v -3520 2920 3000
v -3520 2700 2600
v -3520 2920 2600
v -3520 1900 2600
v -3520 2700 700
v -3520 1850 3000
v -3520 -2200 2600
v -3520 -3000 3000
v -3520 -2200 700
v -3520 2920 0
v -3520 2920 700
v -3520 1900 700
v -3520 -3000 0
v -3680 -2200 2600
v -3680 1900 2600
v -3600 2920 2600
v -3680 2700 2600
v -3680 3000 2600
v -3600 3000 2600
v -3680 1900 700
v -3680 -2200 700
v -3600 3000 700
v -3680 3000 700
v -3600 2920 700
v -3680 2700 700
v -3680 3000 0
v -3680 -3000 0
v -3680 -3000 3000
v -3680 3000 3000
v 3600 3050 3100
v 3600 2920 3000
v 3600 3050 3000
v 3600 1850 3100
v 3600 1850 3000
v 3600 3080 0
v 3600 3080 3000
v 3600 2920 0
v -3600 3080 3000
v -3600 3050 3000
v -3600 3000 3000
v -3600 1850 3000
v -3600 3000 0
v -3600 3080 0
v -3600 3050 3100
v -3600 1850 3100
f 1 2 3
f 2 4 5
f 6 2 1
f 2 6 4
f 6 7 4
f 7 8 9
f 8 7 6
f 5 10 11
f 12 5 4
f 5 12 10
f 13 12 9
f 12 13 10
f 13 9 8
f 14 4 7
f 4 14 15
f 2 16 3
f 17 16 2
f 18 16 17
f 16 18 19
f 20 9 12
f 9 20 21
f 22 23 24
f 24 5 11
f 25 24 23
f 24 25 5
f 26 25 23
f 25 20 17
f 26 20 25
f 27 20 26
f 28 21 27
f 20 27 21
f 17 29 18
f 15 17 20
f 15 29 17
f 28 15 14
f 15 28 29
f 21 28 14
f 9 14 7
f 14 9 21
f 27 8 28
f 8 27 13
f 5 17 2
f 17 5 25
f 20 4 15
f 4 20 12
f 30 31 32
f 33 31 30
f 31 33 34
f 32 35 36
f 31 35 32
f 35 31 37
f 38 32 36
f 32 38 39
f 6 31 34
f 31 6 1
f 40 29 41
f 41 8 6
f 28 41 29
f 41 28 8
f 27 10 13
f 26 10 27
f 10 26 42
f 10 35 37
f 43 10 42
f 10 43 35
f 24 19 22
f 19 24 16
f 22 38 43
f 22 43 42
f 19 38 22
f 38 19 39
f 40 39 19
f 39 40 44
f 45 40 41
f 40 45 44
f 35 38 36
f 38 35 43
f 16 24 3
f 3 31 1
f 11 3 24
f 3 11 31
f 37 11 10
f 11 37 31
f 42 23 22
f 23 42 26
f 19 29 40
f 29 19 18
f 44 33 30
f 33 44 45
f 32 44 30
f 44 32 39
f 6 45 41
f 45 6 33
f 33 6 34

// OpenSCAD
// Original parametric interior. Millimetres, Z-up. Each part is a PBR batch.
// Rebuild with ../tools/bake.py; color() deliberately isn't used (STL has no color).
part = "plaster";
$fn = 32;
module box(p,s) { translate(p) cube(s, center=true); }
module roundbox(p,s,r=30) {
    translate(p) hull() for(x=[-1,1],y=[-1,1])
        translate([x*(s[0]/2-r),y*(s[1]/2-r),0]) cylinder(h=s[2],r=r,center=true);
}
module rod(p,h,r) { translate(p) cylinder(h=h,r=r,center=true); }
module shell() {
    box([0,3000,1500],[7200,160,3000]);
    // Window opening in left wall, built as real solids around the aperture.
    box([-3600,0,350],[160,6000,700]);
    box([-3600,0,2800],[160,6000,400]);
    for(y=[-2600,2300]) box([-3600,y,1650],[160,800,1900]);
    // Open front/right and partial ceiling reveal the interior from outside.
    box([0,2450,3050],[7200,1200,100]);
}
module sofa() {
    roundbox([300,1740,360],[3000,980,260],100);
    for(x=[-650,300,1250]) roundbox([x,1650,560],[920,850,180],85);
    for(x=[-650,300,1250]) roundbox([x,2100,900],[920,260,650],70);
    for(x=[-1300,1900]) roundbox([x,1740,660],[220,1080,650],65);
}
module cushions() {
    for(x=[-750,1250]) translate([x,1850,850]) rotate([14,0,x<0?-12:12])
        roundbox([0,0,0],[520,190,460],60);
}
module wood() {
    // Individual planks produce real seam shadows and reflections.
    for(x=[-3300:300:3300]) for(y=[-2500:1000:2500])
        box([x,y,-35],[296,996,70]);
    roundbox([150,-350,510],[1650,900,110],140);
    box([2700,1700,560],[720,1900,100]);
    for(y=[1050,2350]) box([2700,y,280],[100,100,500]);
    for(x=[-950,1550],y=[1450,2080]) rod([x,y,160],250,40);
    for(x=[-360,660],y=[-580,-120]) rod([x,y,250],450,42);
    // Floating media shelves and vertical oak acoustic slats.
    for(z=[650,1250,1850]) box([-2550,2680,z],[1400,450,60]);
    for(x=[-1800:90:1800]) box([x,2860,1830],[40,65,1700]);
}
module brass() {
    rod([-2200,1250,20],40,260); rod([-2200,1250,1060],2080,24);
    rod([-2200,1250,2190],40,310);
    for(x=[-800,300,1400]) { rod([x,200,2700],600,12); rod([x,200,2400],80,150); }
    // Sculptural nested table with polished rim.
    rod([1200,-900,320],600,24); rod([1200,-900,620],35,330);
    box([250,2850,1910],[1500,65,1000]);
}
module charcoal() {
    roundbox([-2300,-1000,500],[850,850,220],110);
    roundbox([-2300,-650,850],[850,180,650],75);
    for(x=[-2630,-1970],y=[-1250,-750]) rod([x,y,200],380,25);
    box([250,2800,1910],[1430,60,930]);
    box([2700,1700,650],[400,900,100]);
}
module ceramic() {
    // Hollow sculpted porcelain vase on the upper shelf.
    translate([-2820,2650,1880]) rotate_extrude($fn=64)
        polygon([[0,0],[75,0],[105,25],[135,110],[125,200],[85,265],
                 [55,300],[55,355],[43,355],[43,298],[74,258],[113,196],
                 [123,110],[94,33],[65,14],[0,14]]);
    for(x=[-2850,-2350]) translate([x,2650,1280]) difference() {
        cylinder(h=230,r1=80,r2=55); translate([0,0,20]) cylinder(h=230,r=40);
    }
    translate([280,-350,565]) difference() {
        cylinder(h=120,r1=100,r2=160); translate([0,0,20]) cylinder(h=110,r1=80,r2=145);
    }
    translate([2820,-1800,0]) difference() {
        cylinder(h=470,r1=220,r2=300); translate([0,0,40]) cylinder(h=470,r1=190,r2=270);
    }
}
module leaves() {
    for(a=[0:45:315]) translate([2820,-1800,450]) rotate([0,0,a]) {
        rotate([0,18,0]) cylinder(h=1000,r=12);
        translate([200,0,650]) rotate([0,35,0]) scale([100,35,360]) sphere(1);
    }
}
if(part=="plaster") shell();
if(part=="oak") wood();
if(part=="linen") sofa();
if(part=="terracotta") cushions();
if(part=="brass") brass();
if(part=="charcoal") charcoal();
if(part=="ceramic") ceramic();
if(part=="foliage") leaves();
if(part=="rug") roundbox([0,-300,12],[3500,2700,24],180);
if(part=="shade") translate([-2200,1250,1800]) difference() {
    cylinder(h=450,r1=310,r2=190); translate([0,0,-2]) cylinder(h=455,r1=295,r2=175);
}
if(part=="luminous") {
    for(x=[-800,300,1400]) rod([x,200,2350],20,130);
    box([0,2820,2920],[6500,30,35]); rod([-2200,1250,1830],160,65);
}
if(part=="art") {
    box([250,2755,1910],[1350,12,850]);
    // Relief adds a second layer of warm minimalist artwork.
    for(x=[-100,350,700]) translate([x,2735,1910]) rotate([90,0,0]) cylinder(h=20,r=160);
}

// Two thin glass panes in the existing 4100 x 1900 mm wall aperture.
if(part=="glass") for(y=[-1175,875]) box([-3530,y,1650],[8,2020,1840]);
if(part=="window-frame") {
    for(z=[720,2580]) box([-3520,-150,z],[45,4100,40]);
    for(y=[-2180,-150,1880]) box([-3520,y,1650],[45,40,1900]);
}

// Celadon ring sculpture on the middle shelf, with a matching low pedestal.
if(part=="celadon") {
    roundbox([-2370,2650,1310],[330,160,60],35);
    translate([-2370,2650,1510]) rotate([90,0,0])
        rotate_extrude($fn=64) translate([128,0,0]) circle(r=48,$fn=24);
}
if(part=="art-glass") box([250,2708,1910],[1410,5,910]);
module glass_cup(p) {
    translate(p) difference() {
        cylinder(h=115,r1=49,r2=60,$fn=64);
        translate([0,0,7]) cylinder(h=110,r1=43,r2=54,$fn=64);
    }
}
module tea_pot() {
    difference() {
        translate([0,0,130]) scale([150,125,120]) sphere(1,$fn=48);
        translate([0,0,132]) scale([143,118,115]) sphere(1,$fn=48);
        translate([0,0,222]) cylinder(h=60,r=64,$fn=48);
    }
    // Hollow rising spout and circular glass handle.
    translate([110,0,125]) rotate([0,52,0]) difference() {
        cylinder(h=180,r1=42,r2=25,$fn=48);
        translate([0,0,-1]) cylinder(h=182,r1=35,r2=18,$fn=48);
    }
    translate([-155,0,135]) rotate([90,0,0])
        rotate_extrude($fn=64) translate([85,0,0]) circle(r=12,$fn=20);
    translate([0,0,244]) cylinder(h=12,r1=72,r2=62,$fn=48);
    translate([0,0,269]) sphere(r=19,$fn=32);
    cylinder(h=20,r=85,$fn=48);
}
if(part=="tea-glass") {
    translate([-350,-250,565]) tea_pot();
    for(x=[160,400,640]) glass_cup([x,-620,565]);
}
